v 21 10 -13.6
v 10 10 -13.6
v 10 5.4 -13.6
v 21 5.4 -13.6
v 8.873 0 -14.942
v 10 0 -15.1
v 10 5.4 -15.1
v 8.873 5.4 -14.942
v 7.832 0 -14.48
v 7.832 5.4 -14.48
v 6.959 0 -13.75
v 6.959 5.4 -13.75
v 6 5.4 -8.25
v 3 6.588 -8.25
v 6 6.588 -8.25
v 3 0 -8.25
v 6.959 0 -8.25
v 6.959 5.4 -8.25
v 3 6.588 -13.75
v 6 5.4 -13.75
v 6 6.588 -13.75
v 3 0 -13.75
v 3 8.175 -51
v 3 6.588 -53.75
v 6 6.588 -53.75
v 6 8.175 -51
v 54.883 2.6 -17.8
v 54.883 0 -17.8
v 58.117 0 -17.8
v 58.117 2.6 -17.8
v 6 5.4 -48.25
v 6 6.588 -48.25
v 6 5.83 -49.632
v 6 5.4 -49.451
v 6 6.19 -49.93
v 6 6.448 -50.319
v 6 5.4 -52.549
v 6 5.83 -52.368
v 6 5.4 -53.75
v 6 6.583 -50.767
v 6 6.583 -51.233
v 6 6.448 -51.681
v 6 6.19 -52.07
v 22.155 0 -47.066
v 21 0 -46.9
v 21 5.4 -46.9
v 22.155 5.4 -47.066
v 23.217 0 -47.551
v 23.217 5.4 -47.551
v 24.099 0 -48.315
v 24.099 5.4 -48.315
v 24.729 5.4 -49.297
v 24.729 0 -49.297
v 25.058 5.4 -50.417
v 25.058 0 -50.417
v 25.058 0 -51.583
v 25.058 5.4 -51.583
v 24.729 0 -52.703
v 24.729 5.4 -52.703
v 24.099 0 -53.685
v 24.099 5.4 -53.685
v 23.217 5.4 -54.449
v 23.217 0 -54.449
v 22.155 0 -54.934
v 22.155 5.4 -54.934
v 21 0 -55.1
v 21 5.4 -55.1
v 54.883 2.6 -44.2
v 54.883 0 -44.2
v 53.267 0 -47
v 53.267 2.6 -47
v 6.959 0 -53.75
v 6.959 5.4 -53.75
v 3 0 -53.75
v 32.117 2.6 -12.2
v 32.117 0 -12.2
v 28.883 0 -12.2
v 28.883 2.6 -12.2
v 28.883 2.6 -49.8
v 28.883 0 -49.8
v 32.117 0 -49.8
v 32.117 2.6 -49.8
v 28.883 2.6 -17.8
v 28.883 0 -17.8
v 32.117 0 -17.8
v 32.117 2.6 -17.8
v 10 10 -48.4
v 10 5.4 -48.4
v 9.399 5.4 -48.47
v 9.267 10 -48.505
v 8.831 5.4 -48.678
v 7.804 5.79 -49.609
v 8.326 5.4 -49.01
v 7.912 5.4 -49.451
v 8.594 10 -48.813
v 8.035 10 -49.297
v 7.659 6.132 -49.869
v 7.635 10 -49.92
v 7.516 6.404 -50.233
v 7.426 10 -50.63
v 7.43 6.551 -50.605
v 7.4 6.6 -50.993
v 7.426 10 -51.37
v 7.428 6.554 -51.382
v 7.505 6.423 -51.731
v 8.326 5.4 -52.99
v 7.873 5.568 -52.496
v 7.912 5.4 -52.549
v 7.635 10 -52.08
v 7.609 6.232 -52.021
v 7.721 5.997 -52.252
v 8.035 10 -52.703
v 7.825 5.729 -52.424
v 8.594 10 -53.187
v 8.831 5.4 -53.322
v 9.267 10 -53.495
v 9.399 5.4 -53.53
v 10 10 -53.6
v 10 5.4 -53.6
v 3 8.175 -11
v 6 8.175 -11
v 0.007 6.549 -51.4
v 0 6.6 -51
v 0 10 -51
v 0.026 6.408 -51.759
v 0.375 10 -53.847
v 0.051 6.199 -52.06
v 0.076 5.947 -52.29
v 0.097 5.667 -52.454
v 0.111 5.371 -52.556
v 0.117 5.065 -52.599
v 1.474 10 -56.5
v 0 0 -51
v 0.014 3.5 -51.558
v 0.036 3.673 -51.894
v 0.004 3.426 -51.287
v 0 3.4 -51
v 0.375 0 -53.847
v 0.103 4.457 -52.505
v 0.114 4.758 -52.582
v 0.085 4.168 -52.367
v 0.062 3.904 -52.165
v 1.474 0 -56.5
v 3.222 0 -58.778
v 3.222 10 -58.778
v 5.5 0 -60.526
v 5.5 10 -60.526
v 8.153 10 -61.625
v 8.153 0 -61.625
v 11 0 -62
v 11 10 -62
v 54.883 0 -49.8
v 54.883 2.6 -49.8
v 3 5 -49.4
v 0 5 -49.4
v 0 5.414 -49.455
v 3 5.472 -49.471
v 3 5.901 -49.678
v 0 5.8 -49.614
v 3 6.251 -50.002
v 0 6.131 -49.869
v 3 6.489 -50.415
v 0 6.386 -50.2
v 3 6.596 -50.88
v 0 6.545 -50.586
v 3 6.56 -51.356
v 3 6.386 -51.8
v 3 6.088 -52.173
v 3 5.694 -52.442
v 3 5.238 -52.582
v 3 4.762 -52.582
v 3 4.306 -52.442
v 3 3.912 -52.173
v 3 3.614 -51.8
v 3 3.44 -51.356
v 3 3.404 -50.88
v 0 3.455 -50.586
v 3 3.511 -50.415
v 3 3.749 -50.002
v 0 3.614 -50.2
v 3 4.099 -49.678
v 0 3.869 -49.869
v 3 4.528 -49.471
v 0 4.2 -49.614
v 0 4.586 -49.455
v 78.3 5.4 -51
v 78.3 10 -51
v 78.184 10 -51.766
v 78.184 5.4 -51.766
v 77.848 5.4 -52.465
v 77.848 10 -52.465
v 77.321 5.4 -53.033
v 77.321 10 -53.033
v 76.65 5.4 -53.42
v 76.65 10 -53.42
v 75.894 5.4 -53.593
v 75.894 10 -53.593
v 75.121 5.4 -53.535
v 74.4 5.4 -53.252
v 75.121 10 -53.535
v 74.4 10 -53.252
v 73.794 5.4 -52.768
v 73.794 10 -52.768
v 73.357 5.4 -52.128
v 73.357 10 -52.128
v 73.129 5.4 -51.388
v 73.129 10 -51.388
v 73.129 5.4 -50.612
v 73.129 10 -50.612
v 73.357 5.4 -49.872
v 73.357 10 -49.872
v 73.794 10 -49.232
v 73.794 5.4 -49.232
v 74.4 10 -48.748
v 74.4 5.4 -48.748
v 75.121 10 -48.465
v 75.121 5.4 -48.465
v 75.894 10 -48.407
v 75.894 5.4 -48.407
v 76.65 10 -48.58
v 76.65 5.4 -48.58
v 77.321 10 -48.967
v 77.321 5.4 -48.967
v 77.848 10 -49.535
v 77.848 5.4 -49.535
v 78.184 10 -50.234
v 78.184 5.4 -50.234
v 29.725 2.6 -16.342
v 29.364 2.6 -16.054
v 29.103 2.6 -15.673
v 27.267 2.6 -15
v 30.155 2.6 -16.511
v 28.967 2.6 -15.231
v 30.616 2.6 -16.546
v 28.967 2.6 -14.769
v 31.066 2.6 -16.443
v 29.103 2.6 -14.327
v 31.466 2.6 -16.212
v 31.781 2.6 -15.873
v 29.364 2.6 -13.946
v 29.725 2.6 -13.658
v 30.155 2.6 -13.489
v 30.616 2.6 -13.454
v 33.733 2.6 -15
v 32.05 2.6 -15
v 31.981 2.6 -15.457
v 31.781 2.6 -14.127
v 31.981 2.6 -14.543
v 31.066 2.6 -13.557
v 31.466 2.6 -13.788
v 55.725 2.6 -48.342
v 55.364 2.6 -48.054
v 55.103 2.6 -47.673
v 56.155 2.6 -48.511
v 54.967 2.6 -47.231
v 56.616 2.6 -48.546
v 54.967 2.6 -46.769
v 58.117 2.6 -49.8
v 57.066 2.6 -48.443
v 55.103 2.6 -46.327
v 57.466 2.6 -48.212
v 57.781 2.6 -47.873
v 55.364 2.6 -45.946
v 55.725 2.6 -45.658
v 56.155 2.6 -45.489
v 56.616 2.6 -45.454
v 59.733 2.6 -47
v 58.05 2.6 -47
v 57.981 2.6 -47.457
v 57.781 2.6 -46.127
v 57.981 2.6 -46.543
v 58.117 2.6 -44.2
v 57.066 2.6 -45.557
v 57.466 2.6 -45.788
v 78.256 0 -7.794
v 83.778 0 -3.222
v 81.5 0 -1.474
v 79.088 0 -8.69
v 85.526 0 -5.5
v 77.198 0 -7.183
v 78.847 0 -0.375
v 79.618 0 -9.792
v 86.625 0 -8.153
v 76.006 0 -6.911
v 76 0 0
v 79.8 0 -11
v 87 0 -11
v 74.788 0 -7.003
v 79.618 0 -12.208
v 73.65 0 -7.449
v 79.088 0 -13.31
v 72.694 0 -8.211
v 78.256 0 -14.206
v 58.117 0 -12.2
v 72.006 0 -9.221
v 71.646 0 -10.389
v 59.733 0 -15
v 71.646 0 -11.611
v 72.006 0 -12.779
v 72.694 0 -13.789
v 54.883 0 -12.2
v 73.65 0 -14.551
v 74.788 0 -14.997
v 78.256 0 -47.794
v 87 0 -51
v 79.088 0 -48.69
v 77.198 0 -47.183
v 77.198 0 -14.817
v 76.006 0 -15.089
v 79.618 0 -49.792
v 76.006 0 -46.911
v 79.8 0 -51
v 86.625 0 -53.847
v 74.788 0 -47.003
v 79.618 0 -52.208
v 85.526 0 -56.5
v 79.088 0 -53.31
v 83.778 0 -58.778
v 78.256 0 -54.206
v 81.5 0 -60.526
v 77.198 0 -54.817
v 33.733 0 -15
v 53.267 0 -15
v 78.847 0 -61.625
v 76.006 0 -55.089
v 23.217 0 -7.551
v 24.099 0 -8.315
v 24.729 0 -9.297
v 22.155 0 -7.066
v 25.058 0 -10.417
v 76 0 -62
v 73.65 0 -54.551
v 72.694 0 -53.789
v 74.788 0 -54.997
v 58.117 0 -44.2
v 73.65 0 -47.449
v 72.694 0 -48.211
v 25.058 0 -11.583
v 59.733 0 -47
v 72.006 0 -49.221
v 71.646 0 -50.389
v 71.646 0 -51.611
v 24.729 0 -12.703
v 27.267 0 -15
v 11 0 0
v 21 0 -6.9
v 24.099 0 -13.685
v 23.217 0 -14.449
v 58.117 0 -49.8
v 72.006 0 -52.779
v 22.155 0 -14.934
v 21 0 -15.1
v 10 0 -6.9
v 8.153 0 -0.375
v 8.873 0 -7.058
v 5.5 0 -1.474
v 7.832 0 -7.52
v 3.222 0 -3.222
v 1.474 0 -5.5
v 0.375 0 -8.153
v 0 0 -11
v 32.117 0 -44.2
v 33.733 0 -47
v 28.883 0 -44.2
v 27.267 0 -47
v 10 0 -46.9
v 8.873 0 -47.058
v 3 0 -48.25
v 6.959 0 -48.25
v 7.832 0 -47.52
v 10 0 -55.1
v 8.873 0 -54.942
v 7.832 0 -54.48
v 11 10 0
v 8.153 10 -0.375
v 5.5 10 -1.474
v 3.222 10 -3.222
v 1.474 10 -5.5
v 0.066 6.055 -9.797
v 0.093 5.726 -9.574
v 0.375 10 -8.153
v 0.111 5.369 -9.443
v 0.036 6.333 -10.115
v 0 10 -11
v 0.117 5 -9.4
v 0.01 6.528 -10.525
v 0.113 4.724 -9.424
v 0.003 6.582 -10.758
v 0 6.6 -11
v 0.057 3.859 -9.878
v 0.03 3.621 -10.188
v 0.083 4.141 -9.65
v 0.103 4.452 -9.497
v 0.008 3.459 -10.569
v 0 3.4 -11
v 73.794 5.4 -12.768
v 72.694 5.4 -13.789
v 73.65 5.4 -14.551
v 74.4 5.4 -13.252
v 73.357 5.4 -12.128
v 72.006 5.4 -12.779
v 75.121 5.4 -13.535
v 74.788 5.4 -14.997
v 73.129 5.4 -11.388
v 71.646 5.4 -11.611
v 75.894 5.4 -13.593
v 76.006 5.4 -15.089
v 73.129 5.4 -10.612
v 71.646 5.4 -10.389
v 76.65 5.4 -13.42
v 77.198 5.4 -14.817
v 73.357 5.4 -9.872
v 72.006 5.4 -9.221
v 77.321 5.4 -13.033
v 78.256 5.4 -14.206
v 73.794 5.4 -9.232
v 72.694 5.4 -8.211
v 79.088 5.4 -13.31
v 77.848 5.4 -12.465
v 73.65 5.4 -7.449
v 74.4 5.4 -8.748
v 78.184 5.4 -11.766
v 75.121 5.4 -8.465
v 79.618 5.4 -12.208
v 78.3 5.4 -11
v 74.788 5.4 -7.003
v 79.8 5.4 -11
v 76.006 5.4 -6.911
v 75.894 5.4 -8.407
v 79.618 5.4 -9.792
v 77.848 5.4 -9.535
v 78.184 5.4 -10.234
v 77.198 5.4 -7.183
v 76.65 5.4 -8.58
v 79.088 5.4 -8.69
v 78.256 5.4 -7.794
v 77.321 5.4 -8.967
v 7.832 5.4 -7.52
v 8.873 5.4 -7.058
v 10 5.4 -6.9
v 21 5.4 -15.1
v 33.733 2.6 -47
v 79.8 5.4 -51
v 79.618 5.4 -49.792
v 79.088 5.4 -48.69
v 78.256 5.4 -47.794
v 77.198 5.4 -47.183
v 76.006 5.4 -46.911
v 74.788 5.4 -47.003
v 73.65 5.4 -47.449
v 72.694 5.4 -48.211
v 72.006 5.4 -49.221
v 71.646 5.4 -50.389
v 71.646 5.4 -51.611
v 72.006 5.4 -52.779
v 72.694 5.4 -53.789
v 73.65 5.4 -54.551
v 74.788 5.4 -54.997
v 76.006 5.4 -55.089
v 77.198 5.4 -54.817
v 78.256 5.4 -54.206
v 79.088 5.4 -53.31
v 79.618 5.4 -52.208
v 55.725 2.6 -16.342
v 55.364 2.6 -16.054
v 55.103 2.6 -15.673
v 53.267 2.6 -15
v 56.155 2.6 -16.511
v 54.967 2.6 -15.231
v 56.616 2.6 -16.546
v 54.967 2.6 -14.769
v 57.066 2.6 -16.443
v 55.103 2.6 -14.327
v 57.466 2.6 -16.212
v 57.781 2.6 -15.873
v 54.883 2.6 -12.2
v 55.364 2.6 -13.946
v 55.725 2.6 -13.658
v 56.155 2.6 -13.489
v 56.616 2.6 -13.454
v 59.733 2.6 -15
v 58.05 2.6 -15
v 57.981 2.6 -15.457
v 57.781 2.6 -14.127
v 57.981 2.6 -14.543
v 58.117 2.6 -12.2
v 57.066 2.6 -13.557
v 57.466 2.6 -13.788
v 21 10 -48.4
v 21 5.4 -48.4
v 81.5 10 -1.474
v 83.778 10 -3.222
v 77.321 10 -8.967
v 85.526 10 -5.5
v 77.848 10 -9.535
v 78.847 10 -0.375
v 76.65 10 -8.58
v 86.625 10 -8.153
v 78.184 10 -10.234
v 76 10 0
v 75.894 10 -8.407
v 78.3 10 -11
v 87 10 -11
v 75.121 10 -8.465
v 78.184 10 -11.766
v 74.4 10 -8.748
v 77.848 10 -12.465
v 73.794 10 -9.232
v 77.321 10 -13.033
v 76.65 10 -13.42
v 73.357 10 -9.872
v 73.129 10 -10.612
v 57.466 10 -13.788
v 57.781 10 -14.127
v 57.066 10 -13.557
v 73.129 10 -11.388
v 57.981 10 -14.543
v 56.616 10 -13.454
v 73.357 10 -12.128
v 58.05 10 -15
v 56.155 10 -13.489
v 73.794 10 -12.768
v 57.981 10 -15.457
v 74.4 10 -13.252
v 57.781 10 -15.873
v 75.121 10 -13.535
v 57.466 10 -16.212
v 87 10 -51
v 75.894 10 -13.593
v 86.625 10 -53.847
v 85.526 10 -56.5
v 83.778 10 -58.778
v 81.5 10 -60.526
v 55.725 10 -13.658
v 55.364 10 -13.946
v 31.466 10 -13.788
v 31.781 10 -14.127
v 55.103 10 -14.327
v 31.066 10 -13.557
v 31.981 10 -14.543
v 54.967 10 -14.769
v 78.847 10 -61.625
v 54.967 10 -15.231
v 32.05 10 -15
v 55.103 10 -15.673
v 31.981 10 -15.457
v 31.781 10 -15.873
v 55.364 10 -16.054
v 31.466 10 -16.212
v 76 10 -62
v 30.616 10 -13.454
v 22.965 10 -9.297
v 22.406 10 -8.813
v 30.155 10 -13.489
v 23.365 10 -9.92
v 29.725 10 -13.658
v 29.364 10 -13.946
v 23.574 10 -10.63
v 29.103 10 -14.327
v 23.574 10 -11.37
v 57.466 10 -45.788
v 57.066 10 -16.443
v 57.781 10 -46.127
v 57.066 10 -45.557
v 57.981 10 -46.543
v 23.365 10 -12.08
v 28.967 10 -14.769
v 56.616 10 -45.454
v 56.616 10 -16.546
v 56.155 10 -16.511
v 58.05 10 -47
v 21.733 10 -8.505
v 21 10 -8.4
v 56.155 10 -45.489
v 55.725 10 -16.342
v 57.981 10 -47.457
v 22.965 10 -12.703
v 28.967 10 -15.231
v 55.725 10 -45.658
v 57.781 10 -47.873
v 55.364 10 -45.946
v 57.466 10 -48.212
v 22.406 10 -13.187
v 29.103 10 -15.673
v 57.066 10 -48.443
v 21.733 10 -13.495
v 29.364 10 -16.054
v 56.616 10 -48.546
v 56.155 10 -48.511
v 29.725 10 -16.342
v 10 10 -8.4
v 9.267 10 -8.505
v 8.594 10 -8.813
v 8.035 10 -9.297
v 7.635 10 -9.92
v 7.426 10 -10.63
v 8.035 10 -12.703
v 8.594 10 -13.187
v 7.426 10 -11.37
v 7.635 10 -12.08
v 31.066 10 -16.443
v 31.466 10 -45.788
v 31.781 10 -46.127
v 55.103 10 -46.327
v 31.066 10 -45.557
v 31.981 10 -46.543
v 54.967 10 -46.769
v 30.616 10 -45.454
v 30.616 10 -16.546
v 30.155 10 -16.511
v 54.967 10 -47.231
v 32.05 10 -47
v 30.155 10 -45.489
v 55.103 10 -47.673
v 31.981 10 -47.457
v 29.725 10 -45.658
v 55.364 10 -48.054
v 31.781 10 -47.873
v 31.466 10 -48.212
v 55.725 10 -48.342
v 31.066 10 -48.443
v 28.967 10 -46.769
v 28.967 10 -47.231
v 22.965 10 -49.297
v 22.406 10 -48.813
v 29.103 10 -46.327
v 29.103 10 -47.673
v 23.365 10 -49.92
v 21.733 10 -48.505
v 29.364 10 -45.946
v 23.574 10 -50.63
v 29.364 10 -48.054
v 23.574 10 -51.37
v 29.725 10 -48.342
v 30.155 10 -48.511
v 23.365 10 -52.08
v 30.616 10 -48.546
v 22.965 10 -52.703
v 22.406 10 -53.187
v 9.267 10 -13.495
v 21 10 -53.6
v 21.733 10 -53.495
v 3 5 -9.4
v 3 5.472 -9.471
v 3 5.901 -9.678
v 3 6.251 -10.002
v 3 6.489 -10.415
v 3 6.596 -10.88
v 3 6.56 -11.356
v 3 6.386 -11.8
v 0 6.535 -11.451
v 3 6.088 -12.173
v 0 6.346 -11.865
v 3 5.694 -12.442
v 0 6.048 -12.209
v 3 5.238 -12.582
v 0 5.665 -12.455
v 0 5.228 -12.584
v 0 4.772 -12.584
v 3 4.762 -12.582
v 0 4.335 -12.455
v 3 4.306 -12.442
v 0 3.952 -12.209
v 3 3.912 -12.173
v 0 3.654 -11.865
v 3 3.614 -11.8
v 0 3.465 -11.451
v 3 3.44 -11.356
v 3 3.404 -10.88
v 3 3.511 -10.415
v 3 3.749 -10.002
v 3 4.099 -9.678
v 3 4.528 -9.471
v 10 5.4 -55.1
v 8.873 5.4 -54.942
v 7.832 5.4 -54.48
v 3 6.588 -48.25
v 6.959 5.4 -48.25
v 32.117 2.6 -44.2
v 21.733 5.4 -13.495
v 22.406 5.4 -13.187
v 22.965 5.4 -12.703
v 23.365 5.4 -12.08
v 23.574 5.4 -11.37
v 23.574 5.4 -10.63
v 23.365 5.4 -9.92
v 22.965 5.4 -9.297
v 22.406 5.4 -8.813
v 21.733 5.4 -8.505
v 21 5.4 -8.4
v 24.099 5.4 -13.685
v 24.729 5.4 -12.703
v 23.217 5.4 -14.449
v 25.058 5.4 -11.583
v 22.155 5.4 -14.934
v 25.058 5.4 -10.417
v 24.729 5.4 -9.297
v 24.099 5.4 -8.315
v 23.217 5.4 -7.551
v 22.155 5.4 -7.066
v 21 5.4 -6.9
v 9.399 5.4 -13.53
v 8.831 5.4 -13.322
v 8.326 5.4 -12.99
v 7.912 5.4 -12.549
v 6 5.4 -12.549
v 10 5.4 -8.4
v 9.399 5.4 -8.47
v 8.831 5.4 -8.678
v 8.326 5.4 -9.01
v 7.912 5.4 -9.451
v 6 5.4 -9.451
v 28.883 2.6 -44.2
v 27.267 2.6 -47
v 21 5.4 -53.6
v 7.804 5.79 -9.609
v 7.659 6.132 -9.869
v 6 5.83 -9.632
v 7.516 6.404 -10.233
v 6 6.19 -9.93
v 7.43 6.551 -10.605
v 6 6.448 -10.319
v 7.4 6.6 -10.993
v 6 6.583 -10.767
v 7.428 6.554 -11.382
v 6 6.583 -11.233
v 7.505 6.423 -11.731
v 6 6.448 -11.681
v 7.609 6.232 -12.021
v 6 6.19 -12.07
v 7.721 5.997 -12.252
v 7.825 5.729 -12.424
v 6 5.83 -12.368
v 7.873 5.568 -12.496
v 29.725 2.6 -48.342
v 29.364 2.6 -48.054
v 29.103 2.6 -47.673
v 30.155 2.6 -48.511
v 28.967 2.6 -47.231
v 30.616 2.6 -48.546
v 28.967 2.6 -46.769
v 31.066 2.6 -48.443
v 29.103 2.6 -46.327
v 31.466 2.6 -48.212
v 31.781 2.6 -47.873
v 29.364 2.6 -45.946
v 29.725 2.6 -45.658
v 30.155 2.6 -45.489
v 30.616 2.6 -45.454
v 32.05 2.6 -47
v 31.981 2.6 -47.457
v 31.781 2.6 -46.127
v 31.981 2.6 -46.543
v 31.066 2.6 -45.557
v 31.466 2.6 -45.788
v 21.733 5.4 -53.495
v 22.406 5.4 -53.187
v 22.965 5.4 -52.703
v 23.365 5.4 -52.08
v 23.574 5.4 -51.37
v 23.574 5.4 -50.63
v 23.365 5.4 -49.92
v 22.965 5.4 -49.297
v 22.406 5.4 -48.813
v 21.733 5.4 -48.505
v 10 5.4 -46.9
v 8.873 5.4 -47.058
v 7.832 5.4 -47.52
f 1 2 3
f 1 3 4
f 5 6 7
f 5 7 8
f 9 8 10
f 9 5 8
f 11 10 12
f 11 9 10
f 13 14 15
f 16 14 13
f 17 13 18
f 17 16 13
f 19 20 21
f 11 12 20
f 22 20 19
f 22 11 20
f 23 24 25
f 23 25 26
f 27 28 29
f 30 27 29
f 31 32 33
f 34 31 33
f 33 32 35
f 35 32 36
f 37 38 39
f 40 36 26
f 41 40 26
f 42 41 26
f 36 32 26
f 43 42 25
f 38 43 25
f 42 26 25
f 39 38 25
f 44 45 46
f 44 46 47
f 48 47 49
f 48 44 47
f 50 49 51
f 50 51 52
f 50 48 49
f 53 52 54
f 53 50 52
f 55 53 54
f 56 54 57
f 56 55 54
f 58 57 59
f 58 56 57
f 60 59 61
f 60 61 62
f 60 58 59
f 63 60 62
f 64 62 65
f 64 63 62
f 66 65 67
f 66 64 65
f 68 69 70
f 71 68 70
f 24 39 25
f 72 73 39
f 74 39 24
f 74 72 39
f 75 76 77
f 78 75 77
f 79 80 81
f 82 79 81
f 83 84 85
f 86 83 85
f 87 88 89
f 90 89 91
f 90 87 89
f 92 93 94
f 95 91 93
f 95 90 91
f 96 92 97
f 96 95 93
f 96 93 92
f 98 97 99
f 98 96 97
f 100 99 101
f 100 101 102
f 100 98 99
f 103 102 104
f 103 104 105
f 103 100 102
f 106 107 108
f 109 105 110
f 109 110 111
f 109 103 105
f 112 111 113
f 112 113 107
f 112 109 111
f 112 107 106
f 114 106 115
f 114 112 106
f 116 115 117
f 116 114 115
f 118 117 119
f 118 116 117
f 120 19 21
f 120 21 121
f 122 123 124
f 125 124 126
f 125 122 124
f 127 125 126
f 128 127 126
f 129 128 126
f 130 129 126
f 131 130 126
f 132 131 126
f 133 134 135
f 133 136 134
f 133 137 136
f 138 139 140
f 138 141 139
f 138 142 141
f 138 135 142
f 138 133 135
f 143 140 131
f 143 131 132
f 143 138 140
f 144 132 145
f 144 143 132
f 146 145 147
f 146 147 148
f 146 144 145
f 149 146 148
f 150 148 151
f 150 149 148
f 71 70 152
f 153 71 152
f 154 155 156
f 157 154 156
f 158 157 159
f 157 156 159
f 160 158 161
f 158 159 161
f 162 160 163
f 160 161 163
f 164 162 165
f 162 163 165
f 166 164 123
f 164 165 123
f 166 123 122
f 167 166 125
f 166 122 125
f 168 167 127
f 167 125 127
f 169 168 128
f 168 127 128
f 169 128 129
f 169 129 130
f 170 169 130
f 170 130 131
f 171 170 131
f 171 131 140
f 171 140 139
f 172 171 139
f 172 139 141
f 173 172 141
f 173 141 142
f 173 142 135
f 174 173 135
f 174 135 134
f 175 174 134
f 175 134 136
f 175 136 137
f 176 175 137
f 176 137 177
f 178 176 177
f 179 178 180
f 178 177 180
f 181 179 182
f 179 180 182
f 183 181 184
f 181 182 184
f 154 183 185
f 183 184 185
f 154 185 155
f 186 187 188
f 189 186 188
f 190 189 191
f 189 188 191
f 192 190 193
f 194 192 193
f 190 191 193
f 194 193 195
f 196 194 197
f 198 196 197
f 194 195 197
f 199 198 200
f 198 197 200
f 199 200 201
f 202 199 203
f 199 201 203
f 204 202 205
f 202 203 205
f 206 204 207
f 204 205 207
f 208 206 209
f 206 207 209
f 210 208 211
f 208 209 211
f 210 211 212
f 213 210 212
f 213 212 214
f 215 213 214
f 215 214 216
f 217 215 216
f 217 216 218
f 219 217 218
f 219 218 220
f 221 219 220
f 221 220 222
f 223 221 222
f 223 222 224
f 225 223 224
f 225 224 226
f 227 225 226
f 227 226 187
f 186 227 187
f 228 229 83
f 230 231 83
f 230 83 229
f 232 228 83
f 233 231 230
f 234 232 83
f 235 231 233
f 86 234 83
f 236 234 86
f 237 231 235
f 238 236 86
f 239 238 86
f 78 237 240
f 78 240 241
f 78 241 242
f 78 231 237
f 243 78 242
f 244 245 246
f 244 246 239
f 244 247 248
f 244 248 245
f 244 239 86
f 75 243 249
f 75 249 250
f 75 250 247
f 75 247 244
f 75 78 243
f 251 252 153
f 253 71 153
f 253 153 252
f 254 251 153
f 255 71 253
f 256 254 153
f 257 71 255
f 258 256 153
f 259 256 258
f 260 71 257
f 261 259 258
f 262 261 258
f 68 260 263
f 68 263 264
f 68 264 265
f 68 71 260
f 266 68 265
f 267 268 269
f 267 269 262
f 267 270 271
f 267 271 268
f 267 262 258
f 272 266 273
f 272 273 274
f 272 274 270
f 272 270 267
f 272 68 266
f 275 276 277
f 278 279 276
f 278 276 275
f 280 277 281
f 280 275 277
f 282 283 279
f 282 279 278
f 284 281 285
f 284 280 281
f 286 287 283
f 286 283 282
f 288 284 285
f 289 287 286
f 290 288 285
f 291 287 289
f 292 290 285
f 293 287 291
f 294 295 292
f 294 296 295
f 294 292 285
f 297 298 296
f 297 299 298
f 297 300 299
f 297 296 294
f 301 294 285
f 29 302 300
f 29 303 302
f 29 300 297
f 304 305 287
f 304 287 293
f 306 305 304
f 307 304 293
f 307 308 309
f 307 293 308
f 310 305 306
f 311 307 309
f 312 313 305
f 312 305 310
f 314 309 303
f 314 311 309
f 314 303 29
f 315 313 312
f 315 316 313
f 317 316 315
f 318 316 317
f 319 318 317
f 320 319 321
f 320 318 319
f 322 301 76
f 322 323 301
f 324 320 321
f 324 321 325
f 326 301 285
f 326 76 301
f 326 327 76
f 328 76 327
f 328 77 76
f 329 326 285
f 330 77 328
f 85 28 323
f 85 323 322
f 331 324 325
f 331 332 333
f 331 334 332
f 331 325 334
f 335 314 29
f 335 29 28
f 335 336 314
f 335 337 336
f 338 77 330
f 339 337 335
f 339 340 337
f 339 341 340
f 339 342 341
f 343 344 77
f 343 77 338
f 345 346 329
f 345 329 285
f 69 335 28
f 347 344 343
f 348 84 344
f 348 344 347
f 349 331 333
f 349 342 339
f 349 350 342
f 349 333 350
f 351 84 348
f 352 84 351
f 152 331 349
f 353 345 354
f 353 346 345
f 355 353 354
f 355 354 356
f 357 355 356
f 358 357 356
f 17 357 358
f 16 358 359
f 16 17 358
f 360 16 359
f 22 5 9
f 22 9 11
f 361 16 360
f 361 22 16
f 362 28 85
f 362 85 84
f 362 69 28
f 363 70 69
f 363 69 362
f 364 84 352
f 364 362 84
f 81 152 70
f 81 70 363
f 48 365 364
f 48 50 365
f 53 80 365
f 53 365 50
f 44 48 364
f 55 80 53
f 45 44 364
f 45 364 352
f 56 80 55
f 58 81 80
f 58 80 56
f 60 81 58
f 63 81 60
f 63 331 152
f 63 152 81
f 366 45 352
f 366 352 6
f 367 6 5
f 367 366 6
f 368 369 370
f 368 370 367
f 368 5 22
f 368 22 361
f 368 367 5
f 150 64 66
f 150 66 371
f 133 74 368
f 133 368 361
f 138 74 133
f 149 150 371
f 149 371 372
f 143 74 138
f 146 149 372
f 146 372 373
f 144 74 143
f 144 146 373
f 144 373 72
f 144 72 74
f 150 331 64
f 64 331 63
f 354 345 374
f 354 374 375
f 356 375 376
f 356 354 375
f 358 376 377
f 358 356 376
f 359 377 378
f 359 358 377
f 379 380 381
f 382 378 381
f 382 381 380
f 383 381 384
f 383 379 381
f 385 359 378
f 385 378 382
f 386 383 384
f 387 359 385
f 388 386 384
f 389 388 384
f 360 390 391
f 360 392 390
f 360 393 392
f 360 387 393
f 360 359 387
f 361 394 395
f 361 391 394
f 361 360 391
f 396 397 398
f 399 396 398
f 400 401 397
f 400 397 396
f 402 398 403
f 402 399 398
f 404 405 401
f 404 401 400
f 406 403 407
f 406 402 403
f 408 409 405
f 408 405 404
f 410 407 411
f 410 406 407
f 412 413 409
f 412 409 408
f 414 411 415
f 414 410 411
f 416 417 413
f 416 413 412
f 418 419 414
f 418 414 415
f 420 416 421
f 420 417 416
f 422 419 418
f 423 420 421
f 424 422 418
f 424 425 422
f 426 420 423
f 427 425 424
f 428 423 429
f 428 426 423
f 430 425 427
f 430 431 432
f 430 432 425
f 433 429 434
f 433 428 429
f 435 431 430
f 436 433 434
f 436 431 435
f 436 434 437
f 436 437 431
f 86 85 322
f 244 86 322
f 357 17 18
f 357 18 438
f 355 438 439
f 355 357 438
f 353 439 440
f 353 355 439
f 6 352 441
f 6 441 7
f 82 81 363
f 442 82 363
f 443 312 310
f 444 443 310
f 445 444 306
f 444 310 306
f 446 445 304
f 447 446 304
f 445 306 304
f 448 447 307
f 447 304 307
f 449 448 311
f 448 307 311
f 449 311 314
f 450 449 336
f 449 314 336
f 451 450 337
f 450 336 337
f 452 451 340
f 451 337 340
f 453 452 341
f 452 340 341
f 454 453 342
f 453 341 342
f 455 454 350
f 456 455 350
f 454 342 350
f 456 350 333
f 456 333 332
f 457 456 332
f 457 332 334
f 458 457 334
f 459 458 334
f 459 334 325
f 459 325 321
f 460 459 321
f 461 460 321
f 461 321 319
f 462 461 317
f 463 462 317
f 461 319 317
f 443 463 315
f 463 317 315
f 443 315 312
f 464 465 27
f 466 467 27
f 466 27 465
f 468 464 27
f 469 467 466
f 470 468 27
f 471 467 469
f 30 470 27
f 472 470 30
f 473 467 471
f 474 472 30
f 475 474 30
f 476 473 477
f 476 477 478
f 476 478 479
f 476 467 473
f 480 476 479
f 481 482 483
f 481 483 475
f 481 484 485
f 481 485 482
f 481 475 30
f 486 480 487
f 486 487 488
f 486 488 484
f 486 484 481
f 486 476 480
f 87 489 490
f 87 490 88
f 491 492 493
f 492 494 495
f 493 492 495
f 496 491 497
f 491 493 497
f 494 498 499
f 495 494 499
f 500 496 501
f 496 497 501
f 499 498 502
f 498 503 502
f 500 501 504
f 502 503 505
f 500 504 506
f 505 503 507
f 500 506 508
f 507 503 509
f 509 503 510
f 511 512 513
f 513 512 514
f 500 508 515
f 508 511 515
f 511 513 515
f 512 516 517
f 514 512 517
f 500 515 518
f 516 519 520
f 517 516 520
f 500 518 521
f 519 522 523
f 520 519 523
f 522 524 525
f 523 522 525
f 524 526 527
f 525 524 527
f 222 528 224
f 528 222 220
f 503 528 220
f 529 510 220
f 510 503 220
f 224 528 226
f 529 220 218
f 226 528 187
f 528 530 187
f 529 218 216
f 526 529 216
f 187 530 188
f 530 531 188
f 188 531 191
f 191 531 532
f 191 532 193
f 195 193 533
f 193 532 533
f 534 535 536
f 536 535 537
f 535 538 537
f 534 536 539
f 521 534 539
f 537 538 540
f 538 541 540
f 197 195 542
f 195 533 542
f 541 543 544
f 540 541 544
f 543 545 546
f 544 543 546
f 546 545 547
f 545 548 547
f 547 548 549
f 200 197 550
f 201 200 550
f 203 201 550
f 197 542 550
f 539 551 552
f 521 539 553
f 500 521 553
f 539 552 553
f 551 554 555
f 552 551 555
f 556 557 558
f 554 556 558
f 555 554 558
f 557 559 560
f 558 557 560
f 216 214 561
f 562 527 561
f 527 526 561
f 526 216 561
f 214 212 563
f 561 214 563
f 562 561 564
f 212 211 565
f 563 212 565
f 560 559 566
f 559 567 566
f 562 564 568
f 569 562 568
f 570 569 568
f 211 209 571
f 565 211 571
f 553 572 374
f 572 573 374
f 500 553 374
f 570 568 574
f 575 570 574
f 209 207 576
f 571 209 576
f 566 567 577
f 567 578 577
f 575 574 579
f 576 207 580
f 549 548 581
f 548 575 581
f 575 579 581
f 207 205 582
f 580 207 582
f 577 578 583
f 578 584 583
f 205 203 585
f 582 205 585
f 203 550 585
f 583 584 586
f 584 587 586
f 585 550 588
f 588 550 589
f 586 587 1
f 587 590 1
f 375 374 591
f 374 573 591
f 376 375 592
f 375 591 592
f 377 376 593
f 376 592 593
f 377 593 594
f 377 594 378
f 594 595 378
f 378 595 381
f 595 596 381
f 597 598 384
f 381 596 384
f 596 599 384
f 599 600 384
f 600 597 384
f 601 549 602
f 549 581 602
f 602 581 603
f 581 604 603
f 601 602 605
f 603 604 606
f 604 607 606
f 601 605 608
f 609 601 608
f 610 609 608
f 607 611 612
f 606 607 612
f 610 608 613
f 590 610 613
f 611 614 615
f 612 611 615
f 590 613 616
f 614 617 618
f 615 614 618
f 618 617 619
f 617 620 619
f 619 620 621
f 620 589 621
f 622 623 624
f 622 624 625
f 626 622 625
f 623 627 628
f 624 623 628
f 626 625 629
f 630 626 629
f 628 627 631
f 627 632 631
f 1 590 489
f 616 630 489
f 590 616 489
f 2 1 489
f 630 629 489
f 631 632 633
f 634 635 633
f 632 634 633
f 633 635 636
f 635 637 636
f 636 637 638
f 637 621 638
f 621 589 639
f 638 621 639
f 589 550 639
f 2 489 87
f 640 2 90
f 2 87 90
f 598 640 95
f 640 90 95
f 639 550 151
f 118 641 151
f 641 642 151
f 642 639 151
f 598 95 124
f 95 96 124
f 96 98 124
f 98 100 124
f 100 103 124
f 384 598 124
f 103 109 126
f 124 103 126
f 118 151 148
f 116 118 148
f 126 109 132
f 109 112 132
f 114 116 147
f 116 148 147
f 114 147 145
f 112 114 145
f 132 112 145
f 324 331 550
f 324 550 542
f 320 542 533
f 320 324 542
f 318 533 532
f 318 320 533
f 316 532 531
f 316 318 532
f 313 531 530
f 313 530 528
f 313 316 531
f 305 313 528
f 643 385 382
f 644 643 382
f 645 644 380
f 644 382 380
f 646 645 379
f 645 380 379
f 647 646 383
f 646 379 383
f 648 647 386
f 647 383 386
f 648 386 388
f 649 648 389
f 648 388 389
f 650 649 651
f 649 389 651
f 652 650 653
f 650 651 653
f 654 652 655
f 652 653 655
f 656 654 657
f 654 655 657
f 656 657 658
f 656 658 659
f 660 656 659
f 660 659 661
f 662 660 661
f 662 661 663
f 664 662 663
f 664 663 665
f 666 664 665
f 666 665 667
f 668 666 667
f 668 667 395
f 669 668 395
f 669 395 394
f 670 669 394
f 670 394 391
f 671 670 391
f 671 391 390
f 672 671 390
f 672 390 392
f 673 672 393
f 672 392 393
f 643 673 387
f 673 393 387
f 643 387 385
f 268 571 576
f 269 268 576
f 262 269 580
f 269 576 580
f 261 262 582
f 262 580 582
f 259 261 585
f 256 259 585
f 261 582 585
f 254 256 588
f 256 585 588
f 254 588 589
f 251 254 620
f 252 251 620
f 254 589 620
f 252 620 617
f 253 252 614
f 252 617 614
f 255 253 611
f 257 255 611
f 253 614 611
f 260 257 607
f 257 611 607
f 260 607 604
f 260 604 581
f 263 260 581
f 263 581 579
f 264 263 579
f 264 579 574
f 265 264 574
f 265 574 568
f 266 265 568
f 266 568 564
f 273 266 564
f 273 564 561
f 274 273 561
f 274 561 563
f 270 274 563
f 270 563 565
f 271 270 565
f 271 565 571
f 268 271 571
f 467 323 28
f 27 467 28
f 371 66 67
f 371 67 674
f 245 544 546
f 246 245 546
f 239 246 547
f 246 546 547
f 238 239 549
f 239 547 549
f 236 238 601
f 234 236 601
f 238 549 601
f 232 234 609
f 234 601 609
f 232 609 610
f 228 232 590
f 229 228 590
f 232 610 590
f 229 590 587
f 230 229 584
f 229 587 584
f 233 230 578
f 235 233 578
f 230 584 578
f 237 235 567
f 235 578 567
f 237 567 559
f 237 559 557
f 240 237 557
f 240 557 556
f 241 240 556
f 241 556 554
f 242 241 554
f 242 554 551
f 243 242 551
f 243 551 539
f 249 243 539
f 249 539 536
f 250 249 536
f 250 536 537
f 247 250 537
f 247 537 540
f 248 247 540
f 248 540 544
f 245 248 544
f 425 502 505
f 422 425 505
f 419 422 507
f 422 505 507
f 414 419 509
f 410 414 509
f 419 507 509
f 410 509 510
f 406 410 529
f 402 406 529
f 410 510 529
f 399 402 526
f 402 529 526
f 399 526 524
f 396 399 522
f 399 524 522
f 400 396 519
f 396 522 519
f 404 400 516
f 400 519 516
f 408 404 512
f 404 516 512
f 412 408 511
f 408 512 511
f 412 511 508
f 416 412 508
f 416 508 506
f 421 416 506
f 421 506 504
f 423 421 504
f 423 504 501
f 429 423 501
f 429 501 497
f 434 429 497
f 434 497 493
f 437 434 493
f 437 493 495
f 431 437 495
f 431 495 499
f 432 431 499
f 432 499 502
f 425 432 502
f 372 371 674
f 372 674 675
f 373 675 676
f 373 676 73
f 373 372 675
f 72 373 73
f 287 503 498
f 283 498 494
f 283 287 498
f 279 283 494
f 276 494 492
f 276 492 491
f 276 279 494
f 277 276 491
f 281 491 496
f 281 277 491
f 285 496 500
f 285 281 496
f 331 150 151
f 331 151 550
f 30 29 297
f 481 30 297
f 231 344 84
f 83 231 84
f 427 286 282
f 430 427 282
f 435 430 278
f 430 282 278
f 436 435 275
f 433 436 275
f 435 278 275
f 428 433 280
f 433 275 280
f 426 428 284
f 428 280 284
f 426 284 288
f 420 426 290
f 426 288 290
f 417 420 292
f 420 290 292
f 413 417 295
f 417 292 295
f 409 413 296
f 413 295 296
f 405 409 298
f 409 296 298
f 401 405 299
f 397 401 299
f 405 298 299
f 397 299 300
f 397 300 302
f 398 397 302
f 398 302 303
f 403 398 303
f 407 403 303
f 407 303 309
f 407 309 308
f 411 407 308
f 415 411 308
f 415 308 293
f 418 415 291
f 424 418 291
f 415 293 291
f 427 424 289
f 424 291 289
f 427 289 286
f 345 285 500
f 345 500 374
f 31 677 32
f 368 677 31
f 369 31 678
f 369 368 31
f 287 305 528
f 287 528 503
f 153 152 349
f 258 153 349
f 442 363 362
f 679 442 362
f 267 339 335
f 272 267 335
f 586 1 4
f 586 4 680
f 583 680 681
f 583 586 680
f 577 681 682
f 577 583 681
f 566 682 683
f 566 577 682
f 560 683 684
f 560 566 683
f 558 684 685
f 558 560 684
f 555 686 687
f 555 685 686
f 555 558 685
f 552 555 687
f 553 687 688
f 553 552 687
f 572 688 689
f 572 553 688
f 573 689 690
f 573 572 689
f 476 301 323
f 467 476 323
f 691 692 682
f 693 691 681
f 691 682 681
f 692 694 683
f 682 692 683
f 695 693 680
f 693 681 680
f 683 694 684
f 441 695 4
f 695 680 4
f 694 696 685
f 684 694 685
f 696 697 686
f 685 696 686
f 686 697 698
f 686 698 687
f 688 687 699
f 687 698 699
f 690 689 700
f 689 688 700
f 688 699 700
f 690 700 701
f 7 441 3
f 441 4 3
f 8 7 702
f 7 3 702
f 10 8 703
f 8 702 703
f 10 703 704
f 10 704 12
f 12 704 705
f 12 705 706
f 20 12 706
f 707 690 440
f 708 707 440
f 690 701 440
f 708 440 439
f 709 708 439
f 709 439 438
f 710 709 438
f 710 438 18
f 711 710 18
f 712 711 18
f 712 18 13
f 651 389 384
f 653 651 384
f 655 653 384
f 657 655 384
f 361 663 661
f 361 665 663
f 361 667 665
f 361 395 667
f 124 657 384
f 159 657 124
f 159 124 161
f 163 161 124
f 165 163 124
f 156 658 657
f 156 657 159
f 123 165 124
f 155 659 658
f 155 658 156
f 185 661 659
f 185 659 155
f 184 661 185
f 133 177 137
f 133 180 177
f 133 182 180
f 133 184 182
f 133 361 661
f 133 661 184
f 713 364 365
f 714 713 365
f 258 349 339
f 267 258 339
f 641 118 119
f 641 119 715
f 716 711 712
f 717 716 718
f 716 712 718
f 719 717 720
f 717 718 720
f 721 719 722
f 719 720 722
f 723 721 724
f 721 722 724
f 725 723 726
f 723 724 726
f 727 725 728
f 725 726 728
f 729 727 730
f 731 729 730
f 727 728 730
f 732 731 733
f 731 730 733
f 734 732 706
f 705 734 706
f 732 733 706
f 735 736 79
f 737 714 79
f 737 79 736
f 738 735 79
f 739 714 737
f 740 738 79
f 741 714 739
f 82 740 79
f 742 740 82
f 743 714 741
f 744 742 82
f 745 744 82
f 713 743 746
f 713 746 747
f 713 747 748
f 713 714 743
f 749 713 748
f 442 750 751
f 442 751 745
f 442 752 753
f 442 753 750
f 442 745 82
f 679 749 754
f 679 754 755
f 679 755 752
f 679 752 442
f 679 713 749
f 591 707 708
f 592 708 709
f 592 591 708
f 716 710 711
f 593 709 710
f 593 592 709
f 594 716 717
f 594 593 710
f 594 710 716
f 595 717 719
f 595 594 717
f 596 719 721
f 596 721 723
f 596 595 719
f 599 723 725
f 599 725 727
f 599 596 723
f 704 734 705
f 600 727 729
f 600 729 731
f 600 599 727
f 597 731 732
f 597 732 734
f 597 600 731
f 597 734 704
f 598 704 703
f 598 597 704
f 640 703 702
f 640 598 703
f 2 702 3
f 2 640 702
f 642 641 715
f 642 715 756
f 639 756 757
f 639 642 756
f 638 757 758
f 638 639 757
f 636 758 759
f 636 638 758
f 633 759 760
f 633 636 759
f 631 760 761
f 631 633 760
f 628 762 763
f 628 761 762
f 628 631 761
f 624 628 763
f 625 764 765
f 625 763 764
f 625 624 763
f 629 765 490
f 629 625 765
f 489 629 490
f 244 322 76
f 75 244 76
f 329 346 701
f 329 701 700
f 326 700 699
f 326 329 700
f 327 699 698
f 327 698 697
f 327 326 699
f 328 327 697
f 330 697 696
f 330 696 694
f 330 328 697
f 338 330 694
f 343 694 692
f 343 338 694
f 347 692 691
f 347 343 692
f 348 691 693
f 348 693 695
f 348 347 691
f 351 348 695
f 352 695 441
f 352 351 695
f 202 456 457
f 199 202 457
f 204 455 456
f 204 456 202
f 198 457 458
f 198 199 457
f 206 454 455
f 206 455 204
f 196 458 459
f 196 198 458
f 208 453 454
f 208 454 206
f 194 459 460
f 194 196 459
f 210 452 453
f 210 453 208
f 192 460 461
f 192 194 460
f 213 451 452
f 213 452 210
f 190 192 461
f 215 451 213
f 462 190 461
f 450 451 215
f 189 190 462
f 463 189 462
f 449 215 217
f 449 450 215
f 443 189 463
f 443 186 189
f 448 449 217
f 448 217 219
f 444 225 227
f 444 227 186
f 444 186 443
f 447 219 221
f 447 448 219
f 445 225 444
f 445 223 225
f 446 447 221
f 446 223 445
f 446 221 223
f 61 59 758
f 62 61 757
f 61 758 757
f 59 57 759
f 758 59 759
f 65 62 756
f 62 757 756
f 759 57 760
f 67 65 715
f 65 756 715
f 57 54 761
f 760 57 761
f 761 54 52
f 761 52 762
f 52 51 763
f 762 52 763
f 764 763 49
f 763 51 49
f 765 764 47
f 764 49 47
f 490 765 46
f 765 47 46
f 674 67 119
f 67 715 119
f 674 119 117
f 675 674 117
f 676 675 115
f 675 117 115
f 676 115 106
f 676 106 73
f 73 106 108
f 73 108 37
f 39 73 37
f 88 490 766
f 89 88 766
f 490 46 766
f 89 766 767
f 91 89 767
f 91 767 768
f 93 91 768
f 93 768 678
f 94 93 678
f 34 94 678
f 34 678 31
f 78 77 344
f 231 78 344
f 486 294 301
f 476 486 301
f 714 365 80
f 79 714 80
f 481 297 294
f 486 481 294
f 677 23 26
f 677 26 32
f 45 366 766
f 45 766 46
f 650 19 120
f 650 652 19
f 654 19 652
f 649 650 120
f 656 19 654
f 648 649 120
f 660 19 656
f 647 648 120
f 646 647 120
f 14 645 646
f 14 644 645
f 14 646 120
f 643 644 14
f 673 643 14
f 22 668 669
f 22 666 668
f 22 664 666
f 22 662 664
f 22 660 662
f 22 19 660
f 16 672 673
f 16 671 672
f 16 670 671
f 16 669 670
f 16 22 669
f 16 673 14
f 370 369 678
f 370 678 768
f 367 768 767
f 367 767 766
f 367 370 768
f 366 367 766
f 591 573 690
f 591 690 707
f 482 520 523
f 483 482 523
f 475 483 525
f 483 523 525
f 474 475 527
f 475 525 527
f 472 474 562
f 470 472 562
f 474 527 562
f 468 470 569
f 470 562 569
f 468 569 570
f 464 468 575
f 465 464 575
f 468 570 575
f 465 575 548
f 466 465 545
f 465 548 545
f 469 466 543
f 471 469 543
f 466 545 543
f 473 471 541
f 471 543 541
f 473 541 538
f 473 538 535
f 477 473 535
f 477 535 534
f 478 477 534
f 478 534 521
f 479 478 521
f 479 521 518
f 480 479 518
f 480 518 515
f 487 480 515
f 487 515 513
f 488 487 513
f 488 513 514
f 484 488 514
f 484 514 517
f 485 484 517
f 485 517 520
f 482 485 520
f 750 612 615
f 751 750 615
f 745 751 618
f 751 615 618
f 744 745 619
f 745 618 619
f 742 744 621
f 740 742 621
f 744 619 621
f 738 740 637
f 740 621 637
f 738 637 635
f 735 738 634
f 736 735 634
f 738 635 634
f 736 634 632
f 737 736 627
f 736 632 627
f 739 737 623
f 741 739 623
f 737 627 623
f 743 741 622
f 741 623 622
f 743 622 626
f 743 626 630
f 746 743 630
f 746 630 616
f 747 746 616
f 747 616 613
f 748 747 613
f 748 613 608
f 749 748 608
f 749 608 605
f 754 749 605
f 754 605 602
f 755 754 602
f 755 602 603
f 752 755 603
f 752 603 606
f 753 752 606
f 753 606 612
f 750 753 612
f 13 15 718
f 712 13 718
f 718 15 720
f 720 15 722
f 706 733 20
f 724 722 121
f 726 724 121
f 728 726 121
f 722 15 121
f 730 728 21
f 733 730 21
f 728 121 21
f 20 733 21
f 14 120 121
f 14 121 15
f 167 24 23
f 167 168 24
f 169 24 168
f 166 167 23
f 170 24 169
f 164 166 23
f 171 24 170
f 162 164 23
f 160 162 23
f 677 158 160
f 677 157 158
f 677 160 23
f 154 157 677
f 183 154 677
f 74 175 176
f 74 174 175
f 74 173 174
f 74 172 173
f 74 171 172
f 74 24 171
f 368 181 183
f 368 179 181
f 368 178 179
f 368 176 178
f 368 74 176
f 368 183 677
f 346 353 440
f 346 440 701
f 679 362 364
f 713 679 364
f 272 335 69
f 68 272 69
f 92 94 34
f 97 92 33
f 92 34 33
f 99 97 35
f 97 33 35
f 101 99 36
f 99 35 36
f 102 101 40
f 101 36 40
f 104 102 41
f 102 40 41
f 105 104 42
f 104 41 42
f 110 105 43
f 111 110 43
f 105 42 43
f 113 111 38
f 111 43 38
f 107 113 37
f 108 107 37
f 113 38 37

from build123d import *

# Parameters (mm, degrees)
BOSS_EXTRUDE1_DEPTH = 10
CUT_EXTRUDE5_REACH  = 12
SKETCH8_R           = 2.6
SKETCH9_R           = 4.1
CUT_EXTRUDE6_DEPTH  = 5.4
CUT_EXTRUDE7_REACH  = 89
SKETCH11_R          = 1.6
CUT_EXTRUDE8_DEPTH  = 3
CUT_EXTRUDE9_REACH  = 12
SKETCH14_R          = 1.55
CUT_EXTRUDE10_DEPTH = 2.6


with BuildPart() as part:
    # Sketch1 → Boss-Extrude1 (new body)
    with BuildSketch(Plane(origin=(0, 0, 0), x_dir=(1, 0, 0), z_dir=(0, 1, 0))):
        with BuildLine():
            Line((0, 11), (0, 51))
            ThreePointArc((0, 51), (3.221825407, 58.778174593), (11, 62))
            Line((11, 62), (76, 62))
            ThreePointArc((76, 62), (83.778174593, 58.778174593), (87, 51))
            Line((87, 51), (87, 11))
            ThreePointArc((87, 11), (83.778174593, 3.221825407), (76, 0))
            Line((76, 0), (11, 0))
            ThreePointArc((11, 0), (3.221825407, 3.221825407), (0, 11))
        make_face()
    extrude(amount=BOSS_EXTRUDE1_DEPTH)

    # Sketch8 → Cut-Extrude5 (cut, up to next)
    with BuildSketch(Plane(origin=(0, 10, 0), x_dir=(1, 0, 0), z_dir=(0, 1, 0)), mode=Mode.PRIVATE) as cut_extrude5_sk1:
        with Locations((75.7, 51)):
            Circle(SKETCH8_R)
    cut_extrude5_tool1 = extrude(cut_extrude5_sk1.sketch, amount=-CUT_EXTRUDE5_REACH, mode=Mode.PRIVATE) & part.part
    add(cut_extrude5_tool1.solids().sort_by_distance((75.7, 10, -51))[0], mode=Mode.SUBTRACT)
    # Sketch8 → Cut-Extrude5 (cut, up to next)
    with BuildSketch(Plane(origin=(0, 10, 0), x_dir=(1, 0, 0), z_dir=(0, 1, 0)), mode=Mode.PRIVATE) as cut_extrude5_sk2:
        with Locations((75.7, 11)):
            Circle(SKETCH8_R)
    cut_extrude5_tool2 = extrude(cut_extrude5_sk2.sketch, amount=-CUT_EXTRUDE5_REACH, mode=Mode.PRIVATE) & part.part
    add(cut_extrude5_tool2.solids().sort_by_distance((75.7, 10, -11))[0], mode=Mode.SUBTRACT)
    # Sketch8 → Cut-Extrude5 (cut, up to next)
    with BuildSketch(Plane(origin=(0, 10, 0), x_dir=(1, 0, 0), z_dir=(0, 1, 0)), mode=Mode.PRIVATE) as cut_extrude5_sk3:
        with BuildLine():
            Line((10, 53.6), (21, 53.6))
            ThreePointArc((21, 53.6), (23.6, 51), (21, 48.4))
            Line((21, 48.4), (10, 48.4))
            ThreePointArc((10, 48.4), (7.4, 51), (10, 53.6))
        make_face()
    cut_extrude5_tool3 = extrude(cut_extrude5_sk3.sketch, amount=-CUT_EXTRUDE5_REACH, mode=Mode.PRIVATE) & part.part
    add(cut_extrude5_tool3.solids().sort_by_distance((15.5, 10, -51))[0], mode=Mode.SUBTRACT)
    # Sketch8 → Cut-Extrude5 (cut, up to next)
    with BuildSketch(Plane(origin=(0, 10, 0), x_dir=(1, 0, 0), z_dir=(0, 1, 0)), mode=Mode.PRIVATE) as cut_extrude5_sk4:
        with BuildLine():
            Line((10, 13.6), (21, 13.6))
            ThreePointArc((21, 13.6), (23.6, 11), (21, 8.4))
            Line((21, 8.4), (10, 8.4))
            ThreePointArc((10, 8.4), (7.4, 11), (10, 13.6))
        make_face()
    cut_extrude5_tool4 = extrude(cut_extrude5_sk4.sketch, amount=-CUT_EXTRUDE5_REACH, mode=Mode.PRIVATE) & part.part
    add(cut_extrude5_tool4.solids().sort_by_distance((15.5, 10, -11))[0], mode=Mode.SUBTRACT)

    # Sketch9 → Cut-Extrude6 (cut)
    with BuildSketch(Plane.XZ):
        with Locations((75.7, -11)):
            Circle(SKETCH9_R)
        with Locations((75.7, -51)):
            Circle(SKETCH9_R)
        with BuildLine():
            Line((10, -6.9), (21, -6.9))
            ThreePointArc((21, -6.9), (25.1, -11), (21, -15.1))
            Line((21, -15.1), (10, -15.1))
            ThreePointArc((10, -15.1), (8.336419524, -14.747332385), (6.95902976, -13.75))
            Line((6.95902976, -13.75), (3, -13.75))
            Line((3, -13.75), (3, -8.25))
            Line((3, -8.25), (6.95902976, -8.25))
            ThreePointArc((6.95902976, -8.25), (8.336419524, -7.252667615), (10, -6.9))
        make_face()
        with BuildLine():
            Line((10, -46.9), (21, -46.9))
            ThreePointArc((21, -46.9), (25.1, -51), (21, -55.1))
            Line((21, -55.1), (10, -55.1))
            ThreePointArc((10, -55.1), (8.336419524, -54.747332385), (6.95902976, -53.75))
            Line((6.95902976, -53.75), (3, -53.75))
            Line((3, -53.75), (3, -48.25))
            Line((3, -48.25), (6.95902976, -48.25))
            ThreePointArc((6.95902976, -48.25), (8.336419524, -47.252667615), (10, -46.9))
        make_face()
    extrude(amount=-CUT_EXTRUDE6_DEPTH, mode=Mode.SUBTRACT)

    # Sketch11 → Cut-Extrude7 (cut, up to next)
    with BuildSketch(Plane.ZY, mode=Mode.PRIVATE) as cut_extrude7_sk1:
        with Locations((-11, 5)):
            Circle(SKETCH11_R)
    cut_extrude7_tool1 = extrude(cut_extrude7_sk1.sketch, amount=-CUT_EXTRUDE7_REACH, mode=Mode.PRIVATE) & part.part
    add(cut_extrude7_tool1.solids().sort_by_distance((0, 5, -11))[0], mode=Mode.SUBTRACT)
    # Sketch11 → Cut-Extrude7 (cut, up to next)
    with BuildSketch(Plane.ZY, mode=Mode.PRIVATE) as cut_extrude7_sk2:
        with Locations((-51, 5)):
            Circle(SKETCH11_R)
    cut_extrude7_tool2 = extrude(cut_extrude7_sk2.sketch, amount=-CUT_EXTRUDE7_REACH, mode=Mode.PRIVATE) & part.part
    add(cut_extrude7_tool2.solids().sort_by_distance((0, 5, -51))[0], mode=Mode.SUBTRACT)

    # Sketch12 → Cut-Extrude8 (cut)
    with BuildSketch(Plane(origin=(3, 0, 0), x_dir=(0, 0, -1), z_dir=(1, 0, 0))):
        Polygon((48.25, 6.58771324), (48.25, 3.41228676), (51, 1.824573519), (53.75, 3.41228676), (53.75, 6.58771324), (51, 8.175426481), align=None)
        Polygon((13.75, 3.41228676), (13.75, 6.58771324), (11, 8.175426481), (8.25, 6.58771324), (8.25, 3.41228676), (11, 1.824573519), align=None)
    extrude(amount=CUT_EXTRUDE8_DEPTH, mode=Mode.SUBTRACT)

    # Sketch14 → Cut-Extrude9 (cut, up to next)
    with BuildSketch(Plane(origin=(0, 10, 0), x_dir=(1, 0, 0), z_dir=(0, 1, 0)), mode=Mode.PRIVATE) as cut_extrude9_sk1:
        with Locations((30.5, 47)):
            Circle(SKETCH14_R)
    cut_extrude9_tool1 = extrude(cut_extrude9_sk1.sketch, amount=-CUT_EXTRUDE9_REACH, mode=Mode.PRIVATE) & part.part
    add(cut_extrude9_tool1.solids().sort_by_distance((30.5, 10, -47))[0], mode=Mode.SUBTRACT)
    # Sketch14 → Cut-Extrude9 (cut, up to next)
    with BuildSketch(Plane(origin=(0, 10, 0), x_dir=(1, 0, 0), z_dir=(0, 1, 0)), mode=Mode.PRIVATE) as cut_extrude9_sk2:
        with Locations((56.5, 47)):
            Circle(SKETCH14_R)
    cut_extrude9_tool2 = extrude(cut_extrude9_sk2.sketch, amount=-CUT_EXTRUDE9_REACH, mode=Mode.PRIVATE) & part.part
    add(cut_extrude9_tool2.solids().sort_by_distance((56.5, 10, -47))[0], mode=Mode.SUBTRACT)
    # Sketch14 → Cut-Extrude9 (cut, up to next)
    with BuildSketch(Plane(origin=(0, 10, 0), x_dir=(1, 0, 0), z_dir=(0, 1, 0)), mode=Mode.PRIVATE) as cut_extrude9_sk3:
        with Locations((30.5, 15)):
            Circle(SKETCH14_R)
    cut_extrude9_tool3 = extrude(cut_extrude9_sk3.sketch, amount=-CUT_EXTRUDE9_REACH, mode=Mode.PRIVATE) & part.part
    add(cut_extrude9_tool3.solids().sort_by_distance((30.5, 10, -15))[0], mode=Mode.SUBTRACT)
    # Sketch14 → Cut-Extrude9 (cut, up to next)
    with BuildSketch(Plane(origin=(0, 10, 0), x_dir=(1, 0, 0), z_dir=(0, 1, 0)), mode=Mode.PRIVATE) as cut_extrude9_sk4:
        with Locations((56.5, 15)):
            Circle(SKETCH14_R)
    cut_extrude9_tool4 = extrude(cut_extrude9_sk4.sketch, amount=-CUT_EXTRUDE9_REACH, mode=Mode.PRIVATE) & part.part
    add(cut_extrude9_tool4.solids().sort_by_distance((56.5, 10, -15))[0], mode=Mode.SUBTRACT)

    # Sketch15 → Cut-Extrude10 (cut)
    with BuildSketch(Plane.XZ):
        Polygon((33.733161507, -15), (32.116580754, -12.2), (28.883419246, -12.2), (27.266838493, -15), (28.883419246, -17.8), (32.116580754, -17.8), align=None)
        Polygon((59.733161507, -15), (58.116580754, -12.2), (54.883419246, -12.2), (53.266838493, -15), (54.883419246, -17.8), (58.116580754, -17.8), align=None)
        Polygon((59.733161507, -47), (58.116580754, -44.2), (54.883419246, -44.2), (53.266838493, -47), (54.883419246, -49.8), (58.116580754, -49.8), align=None)
        Polygon((33.733161507, -47), (32.116580754, -44.2), (28.883419246, -44.2), (27.266838493, -47), (28.883419246, -49.8), (32.116580754, -49.8), align=None)
    extrude(amount=-CUT_EXTRUDE10_DEPTH, mode=Mode.SUBTRACT)


solid = part.part
